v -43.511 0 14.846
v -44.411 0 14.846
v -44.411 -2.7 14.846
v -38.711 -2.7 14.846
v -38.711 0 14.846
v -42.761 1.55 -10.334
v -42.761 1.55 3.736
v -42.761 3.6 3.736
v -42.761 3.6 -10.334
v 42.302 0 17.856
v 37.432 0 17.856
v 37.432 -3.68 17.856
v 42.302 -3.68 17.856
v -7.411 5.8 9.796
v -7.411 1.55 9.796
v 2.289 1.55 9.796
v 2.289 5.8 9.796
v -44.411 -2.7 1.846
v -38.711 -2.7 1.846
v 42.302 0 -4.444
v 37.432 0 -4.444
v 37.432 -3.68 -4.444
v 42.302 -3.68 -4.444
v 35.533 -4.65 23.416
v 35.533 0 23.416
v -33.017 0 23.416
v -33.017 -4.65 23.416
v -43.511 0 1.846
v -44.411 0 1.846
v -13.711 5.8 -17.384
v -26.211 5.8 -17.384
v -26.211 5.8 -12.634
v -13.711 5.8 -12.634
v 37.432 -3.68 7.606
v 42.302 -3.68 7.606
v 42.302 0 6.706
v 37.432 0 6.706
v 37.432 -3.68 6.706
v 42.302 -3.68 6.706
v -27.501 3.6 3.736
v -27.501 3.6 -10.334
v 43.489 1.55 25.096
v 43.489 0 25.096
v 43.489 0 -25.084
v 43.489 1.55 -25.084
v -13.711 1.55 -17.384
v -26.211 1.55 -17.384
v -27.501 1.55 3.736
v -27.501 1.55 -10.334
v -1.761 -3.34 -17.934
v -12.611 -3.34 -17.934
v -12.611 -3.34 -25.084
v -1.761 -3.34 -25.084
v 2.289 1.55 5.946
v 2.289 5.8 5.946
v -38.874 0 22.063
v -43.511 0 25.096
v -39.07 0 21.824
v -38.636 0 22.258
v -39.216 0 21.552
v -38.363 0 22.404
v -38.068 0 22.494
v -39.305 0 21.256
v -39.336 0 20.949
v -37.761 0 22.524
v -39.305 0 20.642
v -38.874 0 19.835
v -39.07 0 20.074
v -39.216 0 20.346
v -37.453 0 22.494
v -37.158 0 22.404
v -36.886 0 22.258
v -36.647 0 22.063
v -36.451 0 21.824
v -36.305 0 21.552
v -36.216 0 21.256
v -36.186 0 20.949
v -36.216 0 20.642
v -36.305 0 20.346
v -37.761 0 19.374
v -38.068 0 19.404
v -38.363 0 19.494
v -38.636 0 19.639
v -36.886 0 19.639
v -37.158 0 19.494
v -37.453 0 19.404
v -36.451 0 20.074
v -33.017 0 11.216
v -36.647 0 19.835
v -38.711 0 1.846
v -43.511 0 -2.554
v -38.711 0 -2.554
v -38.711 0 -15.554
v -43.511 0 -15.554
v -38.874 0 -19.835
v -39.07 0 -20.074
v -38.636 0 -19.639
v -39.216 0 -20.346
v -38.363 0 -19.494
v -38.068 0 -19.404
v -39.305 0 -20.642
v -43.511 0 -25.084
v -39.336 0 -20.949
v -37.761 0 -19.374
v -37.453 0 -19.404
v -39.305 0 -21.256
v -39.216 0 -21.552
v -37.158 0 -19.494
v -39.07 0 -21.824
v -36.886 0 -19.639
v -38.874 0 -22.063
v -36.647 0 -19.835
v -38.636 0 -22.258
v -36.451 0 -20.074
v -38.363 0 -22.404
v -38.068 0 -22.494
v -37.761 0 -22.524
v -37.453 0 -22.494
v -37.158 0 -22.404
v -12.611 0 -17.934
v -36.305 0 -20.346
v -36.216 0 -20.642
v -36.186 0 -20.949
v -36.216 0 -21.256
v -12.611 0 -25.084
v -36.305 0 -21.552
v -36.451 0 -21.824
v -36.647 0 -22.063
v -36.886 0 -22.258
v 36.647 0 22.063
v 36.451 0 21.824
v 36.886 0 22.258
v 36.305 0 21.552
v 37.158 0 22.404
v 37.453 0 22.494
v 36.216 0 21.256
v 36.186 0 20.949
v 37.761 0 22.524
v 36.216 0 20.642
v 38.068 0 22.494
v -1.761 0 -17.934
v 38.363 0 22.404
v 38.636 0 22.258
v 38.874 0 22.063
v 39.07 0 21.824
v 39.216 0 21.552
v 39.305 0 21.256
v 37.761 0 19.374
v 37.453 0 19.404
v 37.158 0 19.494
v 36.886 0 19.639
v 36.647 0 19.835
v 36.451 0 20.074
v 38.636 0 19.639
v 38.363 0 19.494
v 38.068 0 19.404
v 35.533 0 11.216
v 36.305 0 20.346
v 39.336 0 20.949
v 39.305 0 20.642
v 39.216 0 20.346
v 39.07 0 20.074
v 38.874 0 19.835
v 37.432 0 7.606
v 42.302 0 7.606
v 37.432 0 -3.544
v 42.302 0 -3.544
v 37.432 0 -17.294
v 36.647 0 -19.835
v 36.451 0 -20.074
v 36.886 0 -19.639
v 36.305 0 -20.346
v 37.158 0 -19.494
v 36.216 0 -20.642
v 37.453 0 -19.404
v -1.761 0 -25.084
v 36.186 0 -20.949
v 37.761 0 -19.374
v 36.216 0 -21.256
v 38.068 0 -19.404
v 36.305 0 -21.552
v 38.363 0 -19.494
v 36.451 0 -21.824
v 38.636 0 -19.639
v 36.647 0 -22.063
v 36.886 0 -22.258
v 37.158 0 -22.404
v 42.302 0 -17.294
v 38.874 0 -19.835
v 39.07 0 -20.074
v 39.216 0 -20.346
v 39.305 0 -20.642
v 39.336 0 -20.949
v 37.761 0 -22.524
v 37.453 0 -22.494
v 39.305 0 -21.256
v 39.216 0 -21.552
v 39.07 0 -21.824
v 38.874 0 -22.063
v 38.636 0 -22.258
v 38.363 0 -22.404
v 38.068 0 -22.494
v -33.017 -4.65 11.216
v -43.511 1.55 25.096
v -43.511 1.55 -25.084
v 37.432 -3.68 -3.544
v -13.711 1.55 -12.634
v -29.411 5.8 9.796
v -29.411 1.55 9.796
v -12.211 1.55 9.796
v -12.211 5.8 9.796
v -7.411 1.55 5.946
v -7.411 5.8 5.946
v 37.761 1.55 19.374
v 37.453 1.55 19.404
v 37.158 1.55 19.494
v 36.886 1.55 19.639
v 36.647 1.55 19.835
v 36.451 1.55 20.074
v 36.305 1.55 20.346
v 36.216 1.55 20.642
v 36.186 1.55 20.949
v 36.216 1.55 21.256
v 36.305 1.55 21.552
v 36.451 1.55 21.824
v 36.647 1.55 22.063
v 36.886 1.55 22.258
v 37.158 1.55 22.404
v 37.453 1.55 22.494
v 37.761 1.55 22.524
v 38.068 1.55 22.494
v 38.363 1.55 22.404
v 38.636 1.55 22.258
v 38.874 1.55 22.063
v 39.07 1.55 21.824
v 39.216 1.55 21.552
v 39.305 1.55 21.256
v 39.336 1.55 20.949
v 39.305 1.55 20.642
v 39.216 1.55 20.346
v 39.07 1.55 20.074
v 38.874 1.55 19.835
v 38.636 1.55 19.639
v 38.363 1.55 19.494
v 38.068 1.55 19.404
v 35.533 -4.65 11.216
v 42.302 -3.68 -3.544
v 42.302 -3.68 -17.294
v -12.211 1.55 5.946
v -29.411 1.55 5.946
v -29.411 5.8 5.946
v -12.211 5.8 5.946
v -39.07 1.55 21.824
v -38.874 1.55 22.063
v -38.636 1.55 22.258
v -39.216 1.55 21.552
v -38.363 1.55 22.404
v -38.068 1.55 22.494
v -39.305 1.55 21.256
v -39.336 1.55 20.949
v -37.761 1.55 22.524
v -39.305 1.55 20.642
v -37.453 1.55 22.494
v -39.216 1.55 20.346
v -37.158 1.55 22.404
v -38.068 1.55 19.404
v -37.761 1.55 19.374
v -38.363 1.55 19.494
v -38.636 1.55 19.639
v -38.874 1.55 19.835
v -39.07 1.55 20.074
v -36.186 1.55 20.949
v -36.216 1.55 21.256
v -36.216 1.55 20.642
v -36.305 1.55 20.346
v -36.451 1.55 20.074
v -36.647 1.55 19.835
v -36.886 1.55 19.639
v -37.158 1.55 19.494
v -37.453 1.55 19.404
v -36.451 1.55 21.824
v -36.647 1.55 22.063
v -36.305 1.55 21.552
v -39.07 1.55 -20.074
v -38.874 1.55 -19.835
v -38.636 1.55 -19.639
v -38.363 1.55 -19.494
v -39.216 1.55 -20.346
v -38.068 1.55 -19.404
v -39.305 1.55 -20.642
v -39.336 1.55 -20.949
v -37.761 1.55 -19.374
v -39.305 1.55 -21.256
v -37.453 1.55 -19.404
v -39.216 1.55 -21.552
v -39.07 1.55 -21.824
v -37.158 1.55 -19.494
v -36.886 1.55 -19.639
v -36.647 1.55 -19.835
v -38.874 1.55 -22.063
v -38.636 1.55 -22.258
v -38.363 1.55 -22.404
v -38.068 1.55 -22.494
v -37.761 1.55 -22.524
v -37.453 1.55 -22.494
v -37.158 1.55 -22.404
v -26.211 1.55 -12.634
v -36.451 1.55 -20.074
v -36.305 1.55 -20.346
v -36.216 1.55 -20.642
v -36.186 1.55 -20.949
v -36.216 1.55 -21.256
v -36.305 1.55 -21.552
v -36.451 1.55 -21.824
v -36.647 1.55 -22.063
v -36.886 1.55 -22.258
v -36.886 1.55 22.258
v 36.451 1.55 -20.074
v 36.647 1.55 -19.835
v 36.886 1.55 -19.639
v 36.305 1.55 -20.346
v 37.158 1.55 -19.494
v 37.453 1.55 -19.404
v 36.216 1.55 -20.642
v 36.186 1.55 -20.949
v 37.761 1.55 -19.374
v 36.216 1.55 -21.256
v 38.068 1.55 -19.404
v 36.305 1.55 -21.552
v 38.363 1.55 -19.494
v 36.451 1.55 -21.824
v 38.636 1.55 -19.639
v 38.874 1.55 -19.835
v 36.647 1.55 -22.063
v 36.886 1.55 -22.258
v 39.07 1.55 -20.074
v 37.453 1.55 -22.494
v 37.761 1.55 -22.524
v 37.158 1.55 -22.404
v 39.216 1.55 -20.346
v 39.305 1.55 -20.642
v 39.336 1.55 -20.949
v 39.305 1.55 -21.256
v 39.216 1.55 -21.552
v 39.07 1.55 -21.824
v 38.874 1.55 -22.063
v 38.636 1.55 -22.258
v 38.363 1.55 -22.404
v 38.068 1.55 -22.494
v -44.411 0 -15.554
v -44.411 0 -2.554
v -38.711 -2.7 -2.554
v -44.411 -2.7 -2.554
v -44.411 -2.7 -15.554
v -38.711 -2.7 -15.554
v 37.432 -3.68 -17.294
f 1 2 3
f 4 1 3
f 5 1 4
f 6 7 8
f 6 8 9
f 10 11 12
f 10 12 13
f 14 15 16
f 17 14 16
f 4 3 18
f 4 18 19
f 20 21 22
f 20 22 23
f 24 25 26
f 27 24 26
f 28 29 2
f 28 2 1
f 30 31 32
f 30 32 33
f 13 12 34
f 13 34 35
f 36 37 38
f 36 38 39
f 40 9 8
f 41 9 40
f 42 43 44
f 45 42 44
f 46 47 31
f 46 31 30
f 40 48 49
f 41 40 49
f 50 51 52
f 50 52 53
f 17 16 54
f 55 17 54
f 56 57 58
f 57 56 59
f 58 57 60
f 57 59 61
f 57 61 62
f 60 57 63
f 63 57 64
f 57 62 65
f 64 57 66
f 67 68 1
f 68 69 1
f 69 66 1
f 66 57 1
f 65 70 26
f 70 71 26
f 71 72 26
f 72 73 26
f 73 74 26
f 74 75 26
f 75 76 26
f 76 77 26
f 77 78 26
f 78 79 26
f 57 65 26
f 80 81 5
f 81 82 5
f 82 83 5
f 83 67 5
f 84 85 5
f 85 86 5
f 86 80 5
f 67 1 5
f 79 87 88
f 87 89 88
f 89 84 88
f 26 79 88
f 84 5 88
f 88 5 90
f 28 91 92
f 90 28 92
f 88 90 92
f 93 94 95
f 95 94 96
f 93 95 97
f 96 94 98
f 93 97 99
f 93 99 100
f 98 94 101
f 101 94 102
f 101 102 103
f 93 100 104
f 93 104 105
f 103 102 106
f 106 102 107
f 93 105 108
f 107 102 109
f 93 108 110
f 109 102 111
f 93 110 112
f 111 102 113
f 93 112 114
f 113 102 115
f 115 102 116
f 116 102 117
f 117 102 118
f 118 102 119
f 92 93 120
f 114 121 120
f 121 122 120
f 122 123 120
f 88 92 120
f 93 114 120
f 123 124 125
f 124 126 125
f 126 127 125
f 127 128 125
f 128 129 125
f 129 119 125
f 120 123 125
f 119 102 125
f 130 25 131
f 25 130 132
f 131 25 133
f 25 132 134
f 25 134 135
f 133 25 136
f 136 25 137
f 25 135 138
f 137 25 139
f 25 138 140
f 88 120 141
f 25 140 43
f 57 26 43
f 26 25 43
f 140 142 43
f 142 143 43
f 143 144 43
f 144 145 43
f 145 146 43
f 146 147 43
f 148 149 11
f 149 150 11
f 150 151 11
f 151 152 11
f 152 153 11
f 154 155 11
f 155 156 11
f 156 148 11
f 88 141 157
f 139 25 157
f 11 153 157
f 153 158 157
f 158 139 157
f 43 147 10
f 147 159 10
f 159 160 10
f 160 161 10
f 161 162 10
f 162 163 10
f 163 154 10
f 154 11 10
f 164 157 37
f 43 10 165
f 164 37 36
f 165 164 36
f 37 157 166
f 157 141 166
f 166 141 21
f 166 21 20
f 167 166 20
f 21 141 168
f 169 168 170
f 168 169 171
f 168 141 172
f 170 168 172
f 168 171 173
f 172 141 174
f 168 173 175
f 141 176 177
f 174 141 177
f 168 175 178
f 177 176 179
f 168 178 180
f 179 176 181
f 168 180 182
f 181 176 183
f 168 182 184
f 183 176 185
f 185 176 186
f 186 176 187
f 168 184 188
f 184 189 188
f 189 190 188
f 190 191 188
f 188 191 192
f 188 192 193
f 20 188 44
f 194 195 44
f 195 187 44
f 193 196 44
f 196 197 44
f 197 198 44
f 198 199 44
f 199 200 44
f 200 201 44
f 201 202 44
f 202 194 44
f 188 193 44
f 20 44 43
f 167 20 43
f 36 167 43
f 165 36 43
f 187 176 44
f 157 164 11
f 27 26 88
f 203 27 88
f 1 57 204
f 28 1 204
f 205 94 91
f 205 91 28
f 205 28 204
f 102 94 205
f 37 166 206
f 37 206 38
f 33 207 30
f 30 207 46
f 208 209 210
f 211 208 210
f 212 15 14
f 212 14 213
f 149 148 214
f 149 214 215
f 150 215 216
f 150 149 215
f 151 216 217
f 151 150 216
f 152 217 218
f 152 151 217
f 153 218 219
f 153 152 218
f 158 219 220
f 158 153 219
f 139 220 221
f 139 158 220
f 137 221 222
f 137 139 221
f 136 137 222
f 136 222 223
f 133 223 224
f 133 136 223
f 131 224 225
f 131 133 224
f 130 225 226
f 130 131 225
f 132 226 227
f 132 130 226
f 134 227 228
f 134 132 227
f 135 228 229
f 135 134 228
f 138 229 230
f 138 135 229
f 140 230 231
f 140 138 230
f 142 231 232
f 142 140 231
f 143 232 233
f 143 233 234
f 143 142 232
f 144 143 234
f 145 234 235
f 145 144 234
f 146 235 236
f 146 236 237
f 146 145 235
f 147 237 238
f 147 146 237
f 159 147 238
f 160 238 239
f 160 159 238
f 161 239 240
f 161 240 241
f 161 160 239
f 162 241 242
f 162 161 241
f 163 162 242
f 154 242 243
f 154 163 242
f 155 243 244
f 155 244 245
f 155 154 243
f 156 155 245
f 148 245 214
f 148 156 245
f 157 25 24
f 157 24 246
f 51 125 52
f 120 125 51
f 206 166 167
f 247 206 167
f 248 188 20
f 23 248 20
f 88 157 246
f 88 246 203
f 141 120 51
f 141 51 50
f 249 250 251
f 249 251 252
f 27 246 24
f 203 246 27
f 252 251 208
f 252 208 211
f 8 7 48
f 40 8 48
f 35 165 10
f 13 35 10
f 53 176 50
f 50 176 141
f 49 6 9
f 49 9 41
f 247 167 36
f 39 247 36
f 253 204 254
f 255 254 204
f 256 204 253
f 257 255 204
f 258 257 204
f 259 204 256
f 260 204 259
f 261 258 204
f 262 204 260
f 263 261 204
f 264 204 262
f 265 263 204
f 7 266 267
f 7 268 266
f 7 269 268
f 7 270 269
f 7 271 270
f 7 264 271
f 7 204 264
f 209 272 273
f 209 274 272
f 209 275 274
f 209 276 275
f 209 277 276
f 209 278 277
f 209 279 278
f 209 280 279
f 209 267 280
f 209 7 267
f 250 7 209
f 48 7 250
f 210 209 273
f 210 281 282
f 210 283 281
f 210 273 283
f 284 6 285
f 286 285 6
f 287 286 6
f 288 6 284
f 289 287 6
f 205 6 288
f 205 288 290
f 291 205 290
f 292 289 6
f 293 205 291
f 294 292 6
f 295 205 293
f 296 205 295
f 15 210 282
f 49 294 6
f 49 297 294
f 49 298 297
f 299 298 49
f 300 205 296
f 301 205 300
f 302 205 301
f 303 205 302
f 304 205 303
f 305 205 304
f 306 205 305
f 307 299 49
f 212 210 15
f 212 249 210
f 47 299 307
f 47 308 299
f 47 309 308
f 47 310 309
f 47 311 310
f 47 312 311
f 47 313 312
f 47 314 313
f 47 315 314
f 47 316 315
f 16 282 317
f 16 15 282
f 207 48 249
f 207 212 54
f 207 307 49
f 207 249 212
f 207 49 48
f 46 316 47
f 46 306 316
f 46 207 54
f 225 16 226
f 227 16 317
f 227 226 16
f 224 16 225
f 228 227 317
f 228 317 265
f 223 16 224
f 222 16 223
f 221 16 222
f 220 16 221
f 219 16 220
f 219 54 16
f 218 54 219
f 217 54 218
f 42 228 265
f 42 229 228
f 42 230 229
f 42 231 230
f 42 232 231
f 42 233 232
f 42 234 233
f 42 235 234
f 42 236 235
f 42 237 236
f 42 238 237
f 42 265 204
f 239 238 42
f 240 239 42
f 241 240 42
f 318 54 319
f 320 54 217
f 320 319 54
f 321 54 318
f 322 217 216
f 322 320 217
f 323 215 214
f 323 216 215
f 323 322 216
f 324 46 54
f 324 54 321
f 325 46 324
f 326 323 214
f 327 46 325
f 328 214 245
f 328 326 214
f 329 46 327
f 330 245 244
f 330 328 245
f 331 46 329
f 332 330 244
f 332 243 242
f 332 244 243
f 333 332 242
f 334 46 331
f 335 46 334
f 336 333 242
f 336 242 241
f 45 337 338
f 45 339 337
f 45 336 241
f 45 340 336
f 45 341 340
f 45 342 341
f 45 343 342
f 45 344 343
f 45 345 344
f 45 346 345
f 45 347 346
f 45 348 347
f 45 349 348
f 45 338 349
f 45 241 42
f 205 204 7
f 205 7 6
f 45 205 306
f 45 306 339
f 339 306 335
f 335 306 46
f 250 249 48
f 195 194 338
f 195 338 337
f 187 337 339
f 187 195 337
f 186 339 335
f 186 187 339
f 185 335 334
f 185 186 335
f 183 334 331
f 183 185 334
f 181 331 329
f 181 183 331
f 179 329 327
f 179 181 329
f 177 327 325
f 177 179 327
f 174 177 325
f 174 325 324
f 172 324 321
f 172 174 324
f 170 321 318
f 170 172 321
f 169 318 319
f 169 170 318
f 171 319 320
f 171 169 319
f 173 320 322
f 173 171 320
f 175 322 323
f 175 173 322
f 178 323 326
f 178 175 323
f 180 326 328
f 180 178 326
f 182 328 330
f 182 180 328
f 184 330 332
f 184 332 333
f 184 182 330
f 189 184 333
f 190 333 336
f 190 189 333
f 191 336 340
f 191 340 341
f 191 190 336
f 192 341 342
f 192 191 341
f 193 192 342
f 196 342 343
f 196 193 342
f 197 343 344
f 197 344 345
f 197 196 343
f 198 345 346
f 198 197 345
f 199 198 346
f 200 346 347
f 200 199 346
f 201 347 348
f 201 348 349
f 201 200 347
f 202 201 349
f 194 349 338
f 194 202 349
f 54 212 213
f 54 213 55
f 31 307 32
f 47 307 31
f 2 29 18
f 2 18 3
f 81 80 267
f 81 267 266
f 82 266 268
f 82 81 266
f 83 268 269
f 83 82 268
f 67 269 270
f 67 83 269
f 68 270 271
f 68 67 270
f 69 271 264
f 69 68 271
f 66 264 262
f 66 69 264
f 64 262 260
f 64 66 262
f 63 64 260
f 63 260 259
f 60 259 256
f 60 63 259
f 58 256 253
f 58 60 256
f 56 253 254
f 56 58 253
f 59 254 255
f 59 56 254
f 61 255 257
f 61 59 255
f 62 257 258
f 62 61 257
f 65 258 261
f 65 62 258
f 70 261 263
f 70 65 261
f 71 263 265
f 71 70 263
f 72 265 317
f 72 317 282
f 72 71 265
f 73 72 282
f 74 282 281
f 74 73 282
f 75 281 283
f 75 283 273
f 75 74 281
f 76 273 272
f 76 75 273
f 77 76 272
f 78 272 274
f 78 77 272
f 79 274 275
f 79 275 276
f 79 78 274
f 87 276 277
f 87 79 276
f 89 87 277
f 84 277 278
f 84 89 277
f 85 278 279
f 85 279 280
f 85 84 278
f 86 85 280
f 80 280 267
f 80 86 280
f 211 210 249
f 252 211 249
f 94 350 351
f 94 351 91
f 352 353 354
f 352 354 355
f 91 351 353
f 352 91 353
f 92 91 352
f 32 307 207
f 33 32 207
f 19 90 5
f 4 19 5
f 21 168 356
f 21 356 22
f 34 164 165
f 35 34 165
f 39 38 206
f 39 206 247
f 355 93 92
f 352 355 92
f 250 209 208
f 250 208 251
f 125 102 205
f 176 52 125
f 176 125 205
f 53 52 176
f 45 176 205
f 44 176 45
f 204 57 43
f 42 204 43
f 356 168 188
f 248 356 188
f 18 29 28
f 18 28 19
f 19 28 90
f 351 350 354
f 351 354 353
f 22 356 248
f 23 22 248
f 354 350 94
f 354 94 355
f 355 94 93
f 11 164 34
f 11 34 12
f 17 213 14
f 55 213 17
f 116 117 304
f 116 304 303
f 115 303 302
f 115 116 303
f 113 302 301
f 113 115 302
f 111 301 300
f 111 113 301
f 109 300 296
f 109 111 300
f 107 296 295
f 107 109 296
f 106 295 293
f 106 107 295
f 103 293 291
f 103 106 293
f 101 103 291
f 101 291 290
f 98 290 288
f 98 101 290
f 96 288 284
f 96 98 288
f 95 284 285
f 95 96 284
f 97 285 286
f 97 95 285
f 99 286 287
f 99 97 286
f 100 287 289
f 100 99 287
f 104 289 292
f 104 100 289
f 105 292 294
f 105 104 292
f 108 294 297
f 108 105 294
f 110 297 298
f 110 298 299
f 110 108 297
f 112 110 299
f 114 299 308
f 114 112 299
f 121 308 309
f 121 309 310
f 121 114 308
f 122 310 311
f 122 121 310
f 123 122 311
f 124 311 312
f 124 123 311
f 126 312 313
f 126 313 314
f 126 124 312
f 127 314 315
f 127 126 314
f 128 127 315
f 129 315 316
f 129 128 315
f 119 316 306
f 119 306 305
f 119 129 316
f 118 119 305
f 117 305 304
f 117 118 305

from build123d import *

# Parameters (mm, degrees)
SKETCH2_W           = 87
SKETCH2_H           = 50.18
SKETCH2_R           = 1.575
BOSS_EXTRUDE2_DEPTH = 1.55
SKETCH3_W           = 15.26
SKETCH3_H           = 14.07
BOSS_EXTRUDE3_DEPTH = 2.05
SKETCH4_W           = 17.2
SKETCH4_H           = 3.85
SKETCH4_W_2         = 9.7
SKETCH4_W_3         = 12.5
SKETCH4_H_2         = 4.75
BOSS_EXTRUDE4_DEPTH = 4.25
SKETCH7_W           = 68.55
SKETCH7_H           = 12.2
BOSS_EXTRUDE5_DEPTH = 4.65
SKETCH10_W          = 10.85
SKETCH10_H          = 7.15
BOSS_EXTRUDE6_DEPTH = 3.34
SKETCH11_W          = 5.7
SKETCH11_H          = 13
BOSS_EXTRUDE7_DEPTH = 2.7
SKETCH15_W          = 4.87
SKETCH15_H          = 10.25
SKETCH15_H_2        = 12.85
BOSS_EXTRUDE9_DEPTH = 3.68


with BuildPart() as part:
    # Sketch2 → Boss-Extrude2 (new body)
    with BuildSketch(Plane(origin=(0, 0, 0), x_dir=(1, 0, 0), z_dir=(0, 1, 0))):
        with Locations((-0.010528039, -0.006072379)):
            Rectangle(SKETCH2_W, SKETCH2_H)
        with Locations((-37.760528039, 20.948927621)):
            Circle(SKETCH2_R, mode=Mode.SUBTRACT)
        with Locations((-37.760528039, -20.948927621)):
            Circle(SKETCH2_R, mode=Mode.SUBTRACT)
        with Locations((37.760528039, -20.948927621)):
            Circle(SKETCH2_R, mode=Mode.SUBTRACT)
        with Locations((37.760528039, 20.948927621)):
            Circle(SKETCH2_R, mode=Mode.SUBTRACT)
    extrude(amount=BOSS_EXTRUDE2_DEPTH)

    # Sketch3 → Boss-Extrude3 (add)
    with BuildSketch(Plane(origin=(0, 1.55, 0), x_dir=(1, 0, 0), z_dir=(0, 1, 0))):
        with Locations((-35.130528039, 3.298927621)):
            Rectangle(SKETCH3_W, SKETCH3_H)
    extrude(amount=BOSS_EXTRUDE3_DEPTH)

    # Sketch4 → Boss-Extrude4 (add)
    with BuildSketch(Plane(origin=(0, 1.55, 0), x_dir=(1, 0, 0), z_dir=(0, 1, 0))):
        with Locations((-20.810528039, -7.871072379)):
            Rectangle(SKETCH4_W, SKETCH4_H)
        with Locations((-2.560528039, -7.871072379)):
            Rectangle(SKETCH4_W_2, SKETCH4_H)
        with Locations((-19.960528039, 15.008927621)):
            Rectangle(SKETCH4_W_3, SKETCH4_H_2)
    extrude(amount=BOSS_EXTRUDE4_DEPTH)

    # Sketch7 → Boss-Extrude5 (add)
    with BuildSketch(Plane(origin=(0, 0, 0), x_dir=(-1, 0, 0), z_dir=(0, -1, 0))):
        with Locations((-1.25778805, -17.316072379)):
            Rectangle(SKETCH7_W, SKETCH7_H)
    extrude(amount=BOSS_EXTRUDE5_DEPTH)

    # Sketch10 → Boss-Extrude6 (add)
    with BuildSketch(Plane.XZ):
        with Locations((-7.185528039, -21.508927621)):
            Rectangle(SKETCH10_W, SKETCH10_H)
    extrude(amount=BOSS_EXTRUDE6_DEPTH)

    # Sketch11 → Boss-Extrude7 (add)
    with BuildSketch(Plane.XZ):
        with Locations((-41.560528039, 8.346072379)):
            Rectangle(SKETCH11_W, SKETCH11_H)
        with Locations((-41.560528039, -9.053927621)):
            Rectangle(SKETCH11_W, SKETCH11_H)
    extrude(amount=BOSS_EXTRUDE7_DEPTH)

    # Sketch15 → Boss-Extrude9 (add)
    with BuildSketch(Plane.XZ):
        with Locations((39.867059602, 12.730529287)):
            Rectangle(SKETCH15_W, SKETCH15_H)
        with Locations((39.867059602, 1.580529287)):
            Rectangle(SKETCH15_W, SKETCH15_H)
        with Locations((39.867059602, -10.869470713)):
            Rectangle(SKETCH15_W, SKETCH15_H_2)
    extrude(amount=BOSS_EXTRUDE9_DEPTH)


solid = part.part
